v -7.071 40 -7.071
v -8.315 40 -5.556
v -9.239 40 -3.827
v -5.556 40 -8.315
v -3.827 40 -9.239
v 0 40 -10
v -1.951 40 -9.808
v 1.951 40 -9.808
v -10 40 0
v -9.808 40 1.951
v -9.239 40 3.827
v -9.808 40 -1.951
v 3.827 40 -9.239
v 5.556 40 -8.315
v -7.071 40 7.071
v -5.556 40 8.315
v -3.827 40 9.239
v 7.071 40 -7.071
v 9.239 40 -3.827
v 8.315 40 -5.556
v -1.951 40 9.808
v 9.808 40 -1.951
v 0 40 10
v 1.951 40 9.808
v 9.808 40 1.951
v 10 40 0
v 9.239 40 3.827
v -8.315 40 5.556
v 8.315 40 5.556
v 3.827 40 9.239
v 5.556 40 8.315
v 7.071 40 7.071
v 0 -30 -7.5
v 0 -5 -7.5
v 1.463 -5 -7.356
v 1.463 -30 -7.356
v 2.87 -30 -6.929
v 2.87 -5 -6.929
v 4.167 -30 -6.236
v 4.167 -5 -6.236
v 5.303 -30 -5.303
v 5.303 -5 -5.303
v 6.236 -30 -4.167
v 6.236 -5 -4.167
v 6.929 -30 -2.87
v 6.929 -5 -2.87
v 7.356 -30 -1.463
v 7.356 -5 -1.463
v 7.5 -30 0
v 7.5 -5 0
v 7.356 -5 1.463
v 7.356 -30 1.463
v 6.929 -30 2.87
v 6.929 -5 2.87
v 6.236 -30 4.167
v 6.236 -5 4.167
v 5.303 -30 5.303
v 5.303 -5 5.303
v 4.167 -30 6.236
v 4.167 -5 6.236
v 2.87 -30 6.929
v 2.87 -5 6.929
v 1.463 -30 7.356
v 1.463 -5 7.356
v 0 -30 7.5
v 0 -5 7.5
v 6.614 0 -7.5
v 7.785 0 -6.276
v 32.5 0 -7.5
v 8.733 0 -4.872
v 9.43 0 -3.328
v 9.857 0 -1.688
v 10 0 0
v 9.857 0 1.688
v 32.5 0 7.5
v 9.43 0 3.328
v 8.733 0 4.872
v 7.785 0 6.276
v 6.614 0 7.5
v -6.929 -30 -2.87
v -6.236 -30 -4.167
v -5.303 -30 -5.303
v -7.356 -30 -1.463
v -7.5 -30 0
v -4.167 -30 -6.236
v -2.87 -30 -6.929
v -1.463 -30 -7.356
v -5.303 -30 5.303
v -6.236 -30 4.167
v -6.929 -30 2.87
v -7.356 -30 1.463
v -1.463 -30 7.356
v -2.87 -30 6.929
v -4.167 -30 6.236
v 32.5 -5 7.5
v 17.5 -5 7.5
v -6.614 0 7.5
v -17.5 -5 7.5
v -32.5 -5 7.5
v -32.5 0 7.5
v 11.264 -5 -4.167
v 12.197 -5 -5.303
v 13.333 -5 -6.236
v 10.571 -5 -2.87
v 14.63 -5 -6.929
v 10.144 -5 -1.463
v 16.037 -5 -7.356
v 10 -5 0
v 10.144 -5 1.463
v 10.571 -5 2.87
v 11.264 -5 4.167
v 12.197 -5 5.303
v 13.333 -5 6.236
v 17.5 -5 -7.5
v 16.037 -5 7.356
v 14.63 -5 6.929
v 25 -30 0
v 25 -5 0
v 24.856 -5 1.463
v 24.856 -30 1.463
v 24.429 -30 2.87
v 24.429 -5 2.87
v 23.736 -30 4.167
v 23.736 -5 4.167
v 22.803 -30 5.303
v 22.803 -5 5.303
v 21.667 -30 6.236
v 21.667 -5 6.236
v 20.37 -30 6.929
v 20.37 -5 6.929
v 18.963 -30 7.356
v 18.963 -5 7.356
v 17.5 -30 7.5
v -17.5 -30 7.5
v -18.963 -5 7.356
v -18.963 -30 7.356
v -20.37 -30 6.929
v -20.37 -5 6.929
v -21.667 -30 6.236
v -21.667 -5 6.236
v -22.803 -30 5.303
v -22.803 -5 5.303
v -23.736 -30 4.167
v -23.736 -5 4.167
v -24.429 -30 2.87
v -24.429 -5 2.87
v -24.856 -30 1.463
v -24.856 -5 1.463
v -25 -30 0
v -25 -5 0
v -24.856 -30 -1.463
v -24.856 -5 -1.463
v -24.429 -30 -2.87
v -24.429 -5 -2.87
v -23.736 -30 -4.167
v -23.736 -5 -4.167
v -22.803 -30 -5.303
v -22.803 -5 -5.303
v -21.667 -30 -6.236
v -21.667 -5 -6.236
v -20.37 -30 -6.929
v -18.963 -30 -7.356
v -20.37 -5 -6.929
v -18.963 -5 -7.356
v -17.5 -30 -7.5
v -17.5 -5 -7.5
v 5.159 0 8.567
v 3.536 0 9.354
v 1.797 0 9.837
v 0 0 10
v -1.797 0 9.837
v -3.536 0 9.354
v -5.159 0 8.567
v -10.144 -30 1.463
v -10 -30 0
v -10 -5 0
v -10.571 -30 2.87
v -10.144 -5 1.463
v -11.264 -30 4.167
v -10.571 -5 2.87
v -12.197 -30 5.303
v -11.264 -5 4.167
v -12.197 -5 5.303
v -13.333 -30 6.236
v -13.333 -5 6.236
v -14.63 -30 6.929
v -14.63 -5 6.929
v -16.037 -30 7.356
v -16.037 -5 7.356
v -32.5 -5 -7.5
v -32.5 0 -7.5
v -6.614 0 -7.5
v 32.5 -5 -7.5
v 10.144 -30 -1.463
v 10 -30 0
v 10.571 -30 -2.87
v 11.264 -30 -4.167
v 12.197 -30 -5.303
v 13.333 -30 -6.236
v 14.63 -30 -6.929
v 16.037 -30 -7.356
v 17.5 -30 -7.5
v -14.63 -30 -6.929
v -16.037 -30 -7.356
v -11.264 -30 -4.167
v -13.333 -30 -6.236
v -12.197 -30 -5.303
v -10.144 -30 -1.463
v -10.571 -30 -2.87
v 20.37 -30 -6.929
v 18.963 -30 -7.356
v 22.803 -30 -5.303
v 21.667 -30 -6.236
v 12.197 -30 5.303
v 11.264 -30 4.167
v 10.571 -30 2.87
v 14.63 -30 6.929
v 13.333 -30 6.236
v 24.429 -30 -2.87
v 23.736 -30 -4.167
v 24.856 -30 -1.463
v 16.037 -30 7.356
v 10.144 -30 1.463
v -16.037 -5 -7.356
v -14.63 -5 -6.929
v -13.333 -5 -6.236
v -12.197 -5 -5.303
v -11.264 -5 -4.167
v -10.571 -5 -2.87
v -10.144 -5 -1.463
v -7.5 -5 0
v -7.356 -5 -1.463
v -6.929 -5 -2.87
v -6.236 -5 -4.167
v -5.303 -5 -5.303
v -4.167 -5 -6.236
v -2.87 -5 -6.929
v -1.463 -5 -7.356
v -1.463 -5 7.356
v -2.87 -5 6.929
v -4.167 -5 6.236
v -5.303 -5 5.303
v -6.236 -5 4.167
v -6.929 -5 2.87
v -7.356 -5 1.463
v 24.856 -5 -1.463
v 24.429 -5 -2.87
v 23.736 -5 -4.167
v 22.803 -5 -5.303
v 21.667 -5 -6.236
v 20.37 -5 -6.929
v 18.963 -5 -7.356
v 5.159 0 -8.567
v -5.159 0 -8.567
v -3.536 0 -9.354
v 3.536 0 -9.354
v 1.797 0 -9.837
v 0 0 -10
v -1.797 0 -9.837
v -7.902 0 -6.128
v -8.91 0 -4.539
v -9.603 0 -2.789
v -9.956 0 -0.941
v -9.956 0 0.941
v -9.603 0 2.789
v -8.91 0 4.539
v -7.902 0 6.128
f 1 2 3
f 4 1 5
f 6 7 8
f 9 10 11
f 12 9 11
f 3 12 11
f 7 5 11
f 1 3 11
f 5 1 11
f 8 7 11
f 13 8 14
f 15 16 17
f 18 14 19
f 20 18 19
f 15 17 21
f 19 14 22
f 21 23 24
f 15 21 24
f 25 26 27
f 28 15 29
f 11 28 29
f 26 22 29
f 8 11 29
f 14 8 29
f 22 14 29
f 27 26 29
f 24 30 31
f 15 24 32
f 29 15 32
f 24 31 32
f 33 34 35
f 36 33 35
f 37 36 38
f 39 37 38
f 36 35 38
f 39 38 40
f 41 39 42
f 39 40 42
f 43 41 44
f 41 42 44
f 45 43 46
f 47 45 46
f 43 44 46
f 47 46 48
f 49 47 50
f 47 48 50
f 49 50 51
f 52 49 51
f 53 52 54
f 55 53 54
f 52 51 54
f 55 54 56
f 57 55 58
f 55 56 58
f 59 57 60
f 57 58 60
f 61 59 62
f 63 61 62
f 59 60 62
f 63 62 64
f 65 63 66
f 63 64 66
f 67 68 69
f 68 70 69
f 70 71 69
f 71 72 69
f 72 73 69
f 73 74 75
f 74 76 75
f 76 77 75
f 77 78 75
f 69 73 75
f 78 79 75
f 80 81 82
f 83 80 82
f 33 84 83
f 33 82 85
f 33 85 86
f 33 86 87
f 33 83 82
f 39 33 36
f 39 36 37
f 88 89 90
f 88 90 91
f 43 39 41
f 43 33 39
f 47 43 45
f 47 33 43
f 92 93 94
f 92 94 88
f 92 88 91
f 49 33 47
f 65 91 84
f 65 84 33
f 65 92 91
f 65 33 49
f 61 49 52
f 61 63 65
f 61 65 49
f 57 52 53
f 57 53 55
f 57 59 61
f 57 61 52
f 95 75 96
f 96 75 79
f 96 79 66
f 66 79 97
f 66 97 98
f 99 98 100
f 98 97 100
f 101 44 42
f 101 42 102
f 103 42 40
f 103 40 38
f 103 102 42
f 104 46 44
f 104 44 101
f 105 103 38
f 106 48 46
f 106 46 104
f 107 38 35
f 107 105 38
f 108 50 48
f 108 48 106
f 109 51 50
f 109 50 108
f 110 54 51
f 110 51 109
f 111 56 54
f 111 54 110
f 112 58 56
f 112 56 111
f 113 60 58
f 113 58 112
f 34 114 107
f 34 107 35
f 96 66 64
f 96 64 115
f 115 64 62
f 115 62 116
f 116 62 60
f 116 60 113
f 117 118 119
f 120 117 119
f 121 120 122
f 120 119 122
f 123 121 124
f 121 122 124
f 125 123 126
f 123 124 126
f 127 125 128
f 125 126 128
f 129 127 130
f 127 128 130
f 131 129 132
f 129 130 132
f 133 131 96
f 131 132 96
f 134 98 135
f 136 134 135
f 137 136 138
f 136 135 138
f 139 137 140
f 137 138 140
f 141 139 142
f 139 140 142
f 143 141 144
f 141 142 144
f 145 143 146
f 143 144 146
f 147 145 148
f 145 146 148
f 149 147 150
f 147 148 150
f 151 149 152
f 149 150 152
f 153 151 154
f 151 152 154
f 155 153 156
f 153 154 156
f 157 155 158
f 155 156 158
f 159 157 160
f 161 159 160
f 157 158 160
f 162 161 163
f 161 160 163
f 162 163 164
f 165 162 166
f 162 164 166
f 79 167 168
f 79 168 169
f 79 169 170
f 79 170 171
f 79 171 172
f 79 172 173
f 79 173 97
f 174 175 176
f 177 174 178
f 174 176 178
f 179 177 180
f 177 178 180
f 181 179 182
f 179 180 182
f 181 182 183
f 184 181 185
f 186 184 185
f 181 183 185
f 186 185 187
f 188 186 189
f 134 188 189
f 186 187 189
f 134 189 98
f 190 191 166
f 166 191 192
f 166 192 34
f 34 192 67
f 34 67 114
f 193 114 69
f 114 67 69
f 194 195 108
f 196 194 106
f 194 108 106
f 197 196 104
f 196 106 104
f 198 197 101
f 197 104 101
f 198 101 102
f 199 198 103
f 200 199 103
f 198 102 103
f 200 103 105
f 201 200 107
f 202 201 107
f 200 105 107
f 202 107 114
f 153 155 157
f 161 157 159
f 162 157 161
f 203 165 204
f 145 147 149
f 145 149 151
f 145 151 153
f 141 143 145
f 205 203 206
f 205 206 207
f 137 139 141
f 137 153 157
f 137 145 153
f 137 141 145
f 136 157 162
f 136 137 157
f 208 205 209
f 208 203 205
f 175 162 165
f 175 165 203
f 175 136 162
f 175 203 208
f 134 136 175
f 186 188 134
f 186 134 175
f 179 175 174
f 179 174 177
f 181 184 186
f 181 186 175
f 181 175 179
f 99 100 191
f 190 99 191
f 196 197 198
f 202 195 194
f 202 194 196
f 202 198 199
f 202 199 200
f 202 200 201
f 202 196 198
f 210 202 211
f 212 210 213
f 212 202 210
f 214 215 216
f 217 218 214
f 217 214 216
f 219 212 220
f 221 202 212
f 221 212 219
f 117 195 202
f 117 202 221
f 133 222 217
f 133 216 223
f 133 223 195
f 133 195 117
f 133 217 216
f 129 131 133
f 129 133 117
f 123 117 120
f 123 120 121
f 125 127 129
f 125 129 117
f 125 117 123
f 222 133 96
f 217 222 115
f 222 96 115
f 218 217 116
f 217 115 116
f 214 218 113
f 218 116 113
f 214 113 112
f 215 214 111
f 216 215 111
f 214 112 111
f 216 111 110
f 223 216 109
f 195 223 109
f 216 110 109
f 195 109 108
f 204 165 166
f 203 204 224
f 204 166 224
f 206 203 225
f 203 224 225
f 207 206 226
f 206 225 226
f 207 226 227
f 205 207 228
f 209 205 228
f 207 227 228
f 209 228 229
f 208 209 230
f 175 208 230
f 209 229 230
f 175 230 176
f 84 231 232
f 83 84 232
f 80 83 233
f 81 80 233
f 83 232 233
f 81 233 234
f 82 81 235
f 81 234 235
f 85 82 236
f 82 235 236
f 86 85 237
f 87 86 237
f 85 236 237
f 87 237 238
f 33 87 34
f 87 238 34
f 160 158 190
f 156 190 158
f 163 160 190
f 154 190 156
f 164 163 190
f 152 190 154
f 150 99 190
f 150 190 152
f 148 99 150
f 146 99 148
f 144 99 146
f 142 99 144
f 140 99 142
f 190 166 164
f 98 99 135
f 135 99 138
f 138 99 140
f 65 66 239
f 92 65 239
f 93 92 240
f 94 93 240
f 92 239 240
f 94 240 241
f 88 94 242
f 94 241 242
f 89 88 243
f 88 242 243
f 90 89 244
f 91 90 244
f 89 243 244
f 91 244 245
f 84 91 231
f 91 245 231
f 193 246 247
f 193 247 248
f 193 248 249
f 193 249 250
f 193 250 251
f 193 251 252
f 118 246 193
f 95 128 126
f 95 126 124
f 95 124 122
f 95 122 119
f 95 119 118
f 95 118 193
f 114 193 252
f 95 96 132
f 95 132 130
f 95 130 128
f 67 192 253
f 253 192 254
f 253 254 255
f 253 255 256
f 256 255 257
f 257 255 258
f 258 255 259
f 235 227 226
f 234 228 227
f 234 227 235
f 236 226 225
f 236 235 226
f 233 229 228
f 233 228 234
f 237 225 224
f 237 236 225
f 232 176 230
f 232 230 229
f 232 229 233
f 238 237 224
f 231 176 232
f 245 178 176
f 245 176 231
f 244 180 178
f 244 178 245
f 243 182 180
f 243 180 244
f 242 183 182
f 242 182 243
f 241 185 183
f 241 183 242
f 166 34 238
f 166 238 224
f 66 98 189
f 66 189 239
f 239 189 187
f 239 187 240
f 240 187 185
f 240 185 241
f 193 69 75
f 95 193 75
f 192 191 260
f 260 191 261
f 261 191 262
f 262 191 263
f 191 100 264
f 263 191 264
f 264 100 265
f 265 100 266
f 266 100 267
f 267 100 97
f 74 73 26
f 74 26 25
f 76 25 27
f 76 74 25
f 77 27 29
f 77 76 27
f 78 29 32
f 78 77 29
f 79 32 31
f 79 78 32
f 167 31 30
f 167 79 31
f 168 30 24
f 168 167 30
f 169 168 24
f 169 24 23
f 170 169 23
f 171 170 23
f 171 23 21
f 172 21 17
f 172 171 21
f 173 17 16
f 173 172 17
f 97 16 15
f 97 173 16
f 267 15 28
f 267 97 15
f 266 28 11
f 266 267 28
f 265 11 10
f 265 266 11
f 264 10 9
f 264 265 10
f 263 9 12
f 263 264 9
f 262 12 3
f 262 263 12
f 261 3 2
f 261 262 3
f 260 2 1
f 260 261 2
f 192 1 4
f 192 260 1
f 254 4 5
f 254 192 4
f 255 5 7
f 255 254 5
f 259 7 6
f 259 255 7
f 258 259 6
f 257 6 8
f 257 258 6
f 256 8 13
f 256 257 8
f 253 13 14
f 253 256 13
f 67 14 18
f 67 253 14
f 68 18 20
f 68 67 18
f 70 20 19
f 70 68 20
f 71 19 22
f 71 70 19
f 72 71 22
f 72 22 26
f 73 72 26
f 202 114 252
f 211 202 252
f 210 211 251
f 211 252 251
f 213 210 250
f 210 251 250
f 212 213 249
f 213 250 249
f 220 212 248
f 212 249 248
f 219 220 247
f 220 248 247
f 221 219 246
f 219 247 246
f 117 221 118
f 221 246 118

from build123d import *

# Parameters (mm, degrees)
F1_DEPTH = 5
F2_DEPTH = 30
F3_R     = 10
F4_DEPTH = 40


with BuildPart() as f1:
    # F0 (on Front) → F1 (new body)
    with BuildSketch(Plane.XZ):
        with BuildLine():
            Line((17.5, -7.5), (32.5, -7.5))
            Line((32.5, -7.5), (32.5, 7.5))
            Line((32.5, 7.5), (17.5, 7.5))
            ThreePointArc((17.5, 7.5), (22.803301, 5.303301), (25, 0))
            ThreePointArc((25, 0), (22.803301, -5.303301), (17.5, -7.5))
        make_face()
        with BuildLine():
            Line((0, -7.5), (17.5, -7.5))
            ThreePointArc((17.5, -7.5), (12.196699, -5.303301), (10, 0))
            Line((10, 0), (7.5, 0))
            ThreePointArc((7.5, 0), (5.303301, -5.303301), (0, -7.5))
        make_face()
        with BuildLine():
            ThreePointArc((10, 0), (12.196699, -5.303301), (17.5, -7.5))
            ThreePointArc((17.5, -7.5), (22.803301, -5.303301), (25, 0))
            ThreePointArc((25, 0), (22.803301, 5.303301), (17.5, 7.5))
            ThreePointArc((17.5, 7.5), (12.196699, 5.303301), (10, 0))
        make_face()
        with BuildLine():
            Line((-17.5, -7.5), (0, -7.5))
            ThreePointArc((0, -7.5), (-5.303301, -5.303301), (-7.5, 0))
            Line((-7.5, 0), (-10, 0))
            ThreePointArc((-10, 0), (-12.196699, -5.303301), (-17.5, -7.5))
        make_face()
        with BuildLine():
            Line((7.5, 0), (10, 0))
            ThreePointArc((10, 0), (12.196699, 5.303301), (17.5, 7.5))
            Line((17.5, 7.5), (0, 7.5))
            ThreePointArc((0, 7.5), (5.303301, 5.303301), (7.5, 0))
        make_face()
        with BuildLine():
            Line((-32.5, -7.5), (-17.5, -7.5))
            ThreePointArc((-17.5, -7.5), (-25, 0), (-17.5, 7.5))
            Line((-17.5, 7.5), (-32.5, 7.5))
            Line((-32.5, 7.5), (-32.5, -7.5))
        make_face()
        with BuildLine():
            ThreePointArc((-17.5, 7.5), (-25, 0), (-17.5, -7.5))
            ThreePointArc((-17.5, -7.5), (-12.196699, -5.303301), (-10, 0))
            ThreePointArc((-10, 0), (-12.196699, 5.303301), (-17.5, 7.5))
        make_face()
        with BuildLine():
            Line((-10, 0), (-7.5, 0))
            ThreePointArc((-7.5, 0), (-5.303301, 5.303301), (0, 7.5))
            Line((0, 7.5), (-17.5, 7.5))
            ThreePointArc((-17.5, 7.5), (-12.196699, 5.303301), (-10, 0))
        make_face()
    extrude(amount=F1_DEPTH)

    # F0 (on Front) → F2 (join)
    with BuildSketch(Plane.XZ):
        with BuildLine():
            ThreePointArc((-17.5, 7.5), (-25, 0), (-17.5, -7.5))
            ThreePointArc((-17.5, -7.5), (-12.196699, -5.303301), (-10, 0))
            ThreePointArc((-10, 0), (-12.196699, 5.303301), (-17.5, 7.5))
        make_face()
        with BuildLine():
            ThreePointArc((-7.5, 0), (-5.303301, -5.303301), (0, -7.5))
            ThreePointArc((0, -7.5), (5.303301, -5.303301), (7.5, 0))
            ThreePointArc((7.5, 0), (5.303301, 5.303301), (0, 7.5))
            ThreePointArc((0, 7.5), (-5.303301, 5.303301), (-7.5, 0))
        make_face()
        with BuildLine():
            ThreePointArc((10, 0), (12.196699, -5.303301), (17.5, -7.5))
            ThreePointArc((17.5, -7.5), (22.803301, -5.303301), (25, 0))
            ThreePointArc((25, 0), (22.803301, 5.303301), (17.5, 7.5))
            ThreePointArc((17.5, 7.5), (12.196699, 5.303301), (10, 0))
        make_face()
    extrude(amount=F2_DEPTH)

    # F3 (on Front) → F4 (join)
    with BuildSketch(Plane.XZ):
        Circle(F3_R)
    extrude(amount=-F4_DEPTH)


solid = f1.part
